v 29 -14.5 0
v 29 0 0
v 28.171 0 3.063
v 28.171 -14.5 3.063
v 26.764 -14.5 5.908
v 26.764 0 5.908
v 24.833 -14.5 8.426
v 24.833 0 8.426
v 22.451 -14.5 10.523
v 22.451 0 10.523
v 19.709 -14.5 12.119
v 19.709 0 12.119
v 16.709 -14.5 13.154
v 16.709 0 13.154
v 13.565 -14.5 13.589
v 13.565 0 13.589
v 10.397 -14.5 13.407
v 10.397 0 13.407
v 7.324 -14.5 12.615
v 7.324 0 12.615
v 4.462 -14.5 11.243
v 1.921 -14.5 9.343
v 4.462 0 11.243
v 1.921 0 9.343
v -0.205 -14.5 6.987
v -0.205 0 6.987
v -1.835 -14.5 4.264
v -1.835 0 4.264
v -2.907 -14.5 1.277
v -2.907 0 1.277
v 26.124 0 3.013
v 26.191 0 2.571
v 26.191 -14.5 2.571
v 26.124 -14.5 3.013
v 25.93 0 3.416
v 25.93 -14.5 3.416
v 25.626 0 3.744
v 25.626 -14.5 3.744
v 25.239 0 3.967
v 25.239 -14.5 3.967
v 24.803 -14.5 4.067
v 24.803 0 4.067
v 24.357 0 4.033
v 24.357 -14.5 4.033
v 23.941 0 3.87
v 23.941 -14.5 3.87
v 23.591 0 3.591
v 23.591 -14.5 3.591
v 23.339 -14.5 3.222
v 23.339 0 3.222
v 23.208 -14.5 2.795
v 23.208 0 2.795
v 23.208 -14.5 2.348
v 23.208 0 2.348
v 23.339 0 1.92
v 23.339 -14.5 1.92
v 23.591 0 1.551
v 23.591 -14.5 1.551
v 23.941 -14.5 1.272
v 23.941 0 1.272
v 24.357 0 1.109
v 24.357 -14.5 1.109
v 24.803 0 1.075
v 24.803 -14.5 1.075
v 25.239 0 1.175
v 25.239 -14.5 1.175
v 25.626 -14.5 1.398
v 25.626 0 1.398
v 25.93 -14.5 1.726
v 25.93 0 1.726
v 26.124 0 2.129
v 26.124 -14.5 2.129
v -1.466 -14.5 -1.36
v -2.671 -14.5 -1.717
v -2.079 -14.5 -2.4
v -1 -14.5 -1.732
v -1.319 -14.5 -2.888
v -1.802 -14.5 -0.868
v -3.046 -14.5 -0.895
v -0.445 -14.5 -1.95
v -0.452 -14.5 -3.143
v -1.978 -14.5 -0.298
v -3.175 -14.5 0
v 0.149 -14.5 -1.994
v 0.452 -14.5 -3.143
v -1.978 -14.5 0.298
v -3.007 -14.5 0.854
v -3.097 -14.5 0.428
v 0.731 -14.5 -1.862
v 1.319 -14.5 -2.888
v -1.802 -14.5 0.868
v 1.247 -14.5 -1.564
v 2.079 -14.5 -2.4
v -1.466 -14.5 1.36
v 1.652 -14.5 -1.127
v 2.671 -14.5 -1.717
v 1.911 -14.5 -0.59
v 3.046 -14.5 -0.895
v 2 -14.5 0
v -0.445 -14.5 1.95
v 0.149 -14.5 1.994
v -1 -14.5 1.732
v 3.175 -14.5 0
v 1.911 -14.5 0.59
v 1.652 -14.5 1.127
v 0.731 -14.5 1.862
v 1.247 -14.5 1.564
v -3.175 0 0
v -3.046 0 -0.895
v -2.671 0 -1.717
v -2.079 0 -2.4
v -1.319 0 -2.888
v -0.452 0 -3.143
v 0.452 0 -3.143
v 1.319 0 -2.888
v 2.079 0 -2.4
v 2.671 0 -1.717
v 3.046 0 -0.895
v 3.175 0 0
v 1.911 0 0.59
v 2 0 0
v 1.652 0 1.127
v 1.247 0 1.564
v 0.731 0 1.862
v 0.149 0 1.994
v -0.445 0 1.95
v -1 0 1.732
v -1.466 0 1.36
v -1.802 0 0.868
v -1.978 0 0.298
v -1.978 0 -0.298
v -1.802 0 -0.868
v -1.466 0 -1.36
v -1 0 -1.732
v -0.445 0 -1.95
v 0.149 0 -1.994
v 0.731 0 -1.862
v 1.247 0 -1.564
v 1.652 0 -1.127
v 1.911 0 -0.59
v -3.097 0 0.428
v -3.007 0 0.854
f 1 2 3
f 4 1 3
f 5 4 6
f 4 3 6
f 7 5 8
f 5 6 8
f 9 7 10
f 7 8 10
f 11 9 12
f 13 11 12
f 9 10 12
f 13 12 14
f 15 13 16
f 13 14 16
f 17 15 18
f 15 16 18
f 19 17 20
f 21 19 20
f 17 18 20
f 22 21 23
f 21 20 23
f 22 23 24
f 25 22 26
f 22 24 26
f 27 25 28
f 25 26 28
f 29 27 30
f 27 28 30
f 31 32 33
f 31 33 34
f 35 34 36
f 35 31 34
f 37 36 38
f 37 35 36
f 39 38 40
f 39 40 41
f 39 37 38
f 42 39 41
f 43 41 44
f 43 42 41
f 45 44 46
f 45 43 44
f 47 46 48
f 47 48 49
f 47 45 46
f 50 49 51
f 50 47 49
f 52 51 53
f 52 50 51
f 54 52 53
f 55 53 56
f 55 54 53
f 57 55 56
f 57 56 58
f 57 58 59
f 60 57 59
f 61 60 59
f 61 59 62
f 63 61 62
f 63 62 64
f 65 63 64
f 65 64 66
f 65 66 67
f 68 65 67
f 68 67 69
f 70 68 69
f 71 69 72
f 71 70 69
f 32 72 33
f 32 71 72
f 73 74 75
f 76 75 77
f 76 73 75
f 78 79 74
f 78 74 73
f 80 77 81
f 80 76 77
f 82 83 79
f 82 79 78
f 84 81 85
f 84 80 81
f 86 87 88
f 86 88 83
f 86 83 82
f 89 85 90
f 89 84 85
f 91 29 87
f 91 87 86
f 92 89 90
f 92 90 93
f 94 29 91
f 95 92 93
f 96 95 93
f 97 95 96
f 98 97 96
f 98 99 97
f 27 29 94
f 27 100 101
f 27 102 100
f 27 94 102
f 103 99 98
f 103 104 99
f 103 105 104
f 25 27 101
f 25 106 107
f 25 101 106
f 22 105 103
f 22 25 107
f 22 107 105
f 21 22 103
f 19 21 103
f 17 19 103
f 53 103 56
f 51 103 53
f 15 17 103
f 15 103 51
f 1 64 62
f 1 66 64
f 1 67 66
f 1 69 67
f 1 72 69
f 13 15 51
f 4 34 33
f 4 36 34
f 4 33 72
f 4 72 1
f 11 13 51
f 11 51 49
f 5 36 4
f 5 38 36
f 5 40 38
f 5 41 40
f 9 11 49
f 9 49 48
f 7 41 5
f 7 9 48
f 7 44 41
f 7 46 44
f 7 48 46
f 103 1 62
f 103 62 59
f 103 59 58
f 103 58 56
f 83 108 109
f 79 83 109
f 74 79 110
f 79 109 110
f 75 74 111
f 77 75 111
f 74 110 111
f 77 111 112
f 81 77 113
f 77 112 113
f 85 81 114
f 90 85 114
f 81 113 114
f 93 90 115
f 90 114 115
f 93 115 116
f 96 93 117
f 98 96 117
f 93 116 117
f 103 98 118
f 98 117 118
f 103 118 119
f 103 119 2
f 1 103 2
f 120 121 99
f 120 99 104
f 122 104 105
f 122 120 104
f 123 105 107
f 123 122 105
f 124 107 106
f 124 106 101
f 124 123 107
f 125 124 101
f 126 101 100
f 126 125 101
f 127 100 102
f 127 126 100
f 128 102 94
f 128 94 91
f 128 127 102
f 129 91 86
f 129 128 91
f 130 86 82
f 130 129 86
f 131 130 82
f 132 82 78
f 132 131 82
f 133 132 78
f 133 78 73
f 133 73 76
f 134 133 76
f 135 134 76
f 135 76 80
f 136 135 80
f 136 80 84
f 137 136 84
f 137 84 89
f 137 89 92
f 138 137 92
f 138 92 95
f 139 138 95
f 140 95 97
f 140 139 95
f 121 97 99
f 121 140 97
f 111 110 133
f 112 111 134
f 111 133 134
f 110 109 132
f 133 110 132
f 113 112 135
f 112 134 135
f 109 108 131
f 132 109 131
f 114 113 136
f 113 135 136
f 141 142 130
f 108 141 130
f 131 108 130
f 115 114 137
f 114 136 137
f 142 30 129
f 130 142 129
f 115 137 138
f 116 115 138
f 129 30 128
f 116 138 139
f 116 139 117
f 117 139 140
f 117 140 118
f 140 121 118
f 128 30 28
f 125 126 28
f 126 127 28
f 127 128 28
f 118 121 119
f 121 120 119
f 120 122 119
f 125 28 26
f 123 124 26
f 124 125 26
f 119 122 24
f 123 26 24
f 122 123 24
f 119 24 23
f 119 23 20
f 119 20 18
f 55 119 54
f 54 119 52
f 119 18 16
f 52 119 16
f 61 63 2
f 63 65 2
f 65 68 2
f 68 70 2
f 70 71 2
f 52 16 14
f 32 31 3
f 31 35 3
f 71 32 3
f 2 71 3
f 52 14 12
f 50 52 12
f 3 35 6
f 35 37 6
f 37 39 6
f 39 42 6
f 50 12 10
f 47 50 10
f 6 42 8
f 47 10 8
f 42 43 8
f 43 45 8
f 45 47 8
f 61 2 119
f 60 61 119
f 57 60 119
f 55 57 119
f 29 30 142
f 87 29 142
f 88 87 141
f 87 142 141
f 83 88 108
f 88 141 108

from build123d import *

# Parameters (mm, degrees)
F0_R     = 1.5
F1_DEPTH = 14.5
F0_R_2   = 2
F2_DEPTH = 14.5


with BuildPart() as f1:
    # F0 (on Front) → F1 (new body)
    with BuildSketch(Plane.XZ):
        with BuildLine():
            ThreePointArc((-2.9066747097, 1.2774455495), (0.6526610133, 3.1071946514), (3.175, 0))
            Line((3.175, 0), (29, 0))
            ThreePointArc((29, 0), (13.5651610133, 13.5892229178), (-2.9066747097, 1.2774455495))
        make_face()
        with Locations((24.690752849, 2.5710954797)):
            Circle(F0_R, mode=Mode.SUBTRACT)
    extrude(amount=F1_DEPTH)

    # F0 (on Front) → F2 (join)
    with BuildSketch(Plane.XZ):
        with BuildLine():
            ThreePointArc((-2.9066747097, 1.2774455495), (0.6526610133, 3.1071946514), (3.175, 0))
            Line((3.175, 0), (29, 0))
            ThreePointArc((29, 0), (13.5651610133, 13.5892229178), (-2.9066747097, 1.2774455495))
        make_face()
        with Locations((24.690752849, 2.5710954797)):
            Circle(F0_R, mode=Mode.SUBTRACT)
        with BuildLine():
            ThreePointArc((-3.175, 0), (0, -3.175), (3.175, 0))
            ThreePointArc((3.175, 0), (0.6526610133, 3.1071946514), (-2.9066747097, 1.2774455495))
            ThreePointArc((-2.9066747097, 1.2774455495), (-3.053618487, 0.6414074301), (-3.175, 0))
        make_face()
        Circle(F0_R_2, mode=Mode.SUBTRACT)
    extrude(amount=F2_DEPTH)


solid = f1.part
